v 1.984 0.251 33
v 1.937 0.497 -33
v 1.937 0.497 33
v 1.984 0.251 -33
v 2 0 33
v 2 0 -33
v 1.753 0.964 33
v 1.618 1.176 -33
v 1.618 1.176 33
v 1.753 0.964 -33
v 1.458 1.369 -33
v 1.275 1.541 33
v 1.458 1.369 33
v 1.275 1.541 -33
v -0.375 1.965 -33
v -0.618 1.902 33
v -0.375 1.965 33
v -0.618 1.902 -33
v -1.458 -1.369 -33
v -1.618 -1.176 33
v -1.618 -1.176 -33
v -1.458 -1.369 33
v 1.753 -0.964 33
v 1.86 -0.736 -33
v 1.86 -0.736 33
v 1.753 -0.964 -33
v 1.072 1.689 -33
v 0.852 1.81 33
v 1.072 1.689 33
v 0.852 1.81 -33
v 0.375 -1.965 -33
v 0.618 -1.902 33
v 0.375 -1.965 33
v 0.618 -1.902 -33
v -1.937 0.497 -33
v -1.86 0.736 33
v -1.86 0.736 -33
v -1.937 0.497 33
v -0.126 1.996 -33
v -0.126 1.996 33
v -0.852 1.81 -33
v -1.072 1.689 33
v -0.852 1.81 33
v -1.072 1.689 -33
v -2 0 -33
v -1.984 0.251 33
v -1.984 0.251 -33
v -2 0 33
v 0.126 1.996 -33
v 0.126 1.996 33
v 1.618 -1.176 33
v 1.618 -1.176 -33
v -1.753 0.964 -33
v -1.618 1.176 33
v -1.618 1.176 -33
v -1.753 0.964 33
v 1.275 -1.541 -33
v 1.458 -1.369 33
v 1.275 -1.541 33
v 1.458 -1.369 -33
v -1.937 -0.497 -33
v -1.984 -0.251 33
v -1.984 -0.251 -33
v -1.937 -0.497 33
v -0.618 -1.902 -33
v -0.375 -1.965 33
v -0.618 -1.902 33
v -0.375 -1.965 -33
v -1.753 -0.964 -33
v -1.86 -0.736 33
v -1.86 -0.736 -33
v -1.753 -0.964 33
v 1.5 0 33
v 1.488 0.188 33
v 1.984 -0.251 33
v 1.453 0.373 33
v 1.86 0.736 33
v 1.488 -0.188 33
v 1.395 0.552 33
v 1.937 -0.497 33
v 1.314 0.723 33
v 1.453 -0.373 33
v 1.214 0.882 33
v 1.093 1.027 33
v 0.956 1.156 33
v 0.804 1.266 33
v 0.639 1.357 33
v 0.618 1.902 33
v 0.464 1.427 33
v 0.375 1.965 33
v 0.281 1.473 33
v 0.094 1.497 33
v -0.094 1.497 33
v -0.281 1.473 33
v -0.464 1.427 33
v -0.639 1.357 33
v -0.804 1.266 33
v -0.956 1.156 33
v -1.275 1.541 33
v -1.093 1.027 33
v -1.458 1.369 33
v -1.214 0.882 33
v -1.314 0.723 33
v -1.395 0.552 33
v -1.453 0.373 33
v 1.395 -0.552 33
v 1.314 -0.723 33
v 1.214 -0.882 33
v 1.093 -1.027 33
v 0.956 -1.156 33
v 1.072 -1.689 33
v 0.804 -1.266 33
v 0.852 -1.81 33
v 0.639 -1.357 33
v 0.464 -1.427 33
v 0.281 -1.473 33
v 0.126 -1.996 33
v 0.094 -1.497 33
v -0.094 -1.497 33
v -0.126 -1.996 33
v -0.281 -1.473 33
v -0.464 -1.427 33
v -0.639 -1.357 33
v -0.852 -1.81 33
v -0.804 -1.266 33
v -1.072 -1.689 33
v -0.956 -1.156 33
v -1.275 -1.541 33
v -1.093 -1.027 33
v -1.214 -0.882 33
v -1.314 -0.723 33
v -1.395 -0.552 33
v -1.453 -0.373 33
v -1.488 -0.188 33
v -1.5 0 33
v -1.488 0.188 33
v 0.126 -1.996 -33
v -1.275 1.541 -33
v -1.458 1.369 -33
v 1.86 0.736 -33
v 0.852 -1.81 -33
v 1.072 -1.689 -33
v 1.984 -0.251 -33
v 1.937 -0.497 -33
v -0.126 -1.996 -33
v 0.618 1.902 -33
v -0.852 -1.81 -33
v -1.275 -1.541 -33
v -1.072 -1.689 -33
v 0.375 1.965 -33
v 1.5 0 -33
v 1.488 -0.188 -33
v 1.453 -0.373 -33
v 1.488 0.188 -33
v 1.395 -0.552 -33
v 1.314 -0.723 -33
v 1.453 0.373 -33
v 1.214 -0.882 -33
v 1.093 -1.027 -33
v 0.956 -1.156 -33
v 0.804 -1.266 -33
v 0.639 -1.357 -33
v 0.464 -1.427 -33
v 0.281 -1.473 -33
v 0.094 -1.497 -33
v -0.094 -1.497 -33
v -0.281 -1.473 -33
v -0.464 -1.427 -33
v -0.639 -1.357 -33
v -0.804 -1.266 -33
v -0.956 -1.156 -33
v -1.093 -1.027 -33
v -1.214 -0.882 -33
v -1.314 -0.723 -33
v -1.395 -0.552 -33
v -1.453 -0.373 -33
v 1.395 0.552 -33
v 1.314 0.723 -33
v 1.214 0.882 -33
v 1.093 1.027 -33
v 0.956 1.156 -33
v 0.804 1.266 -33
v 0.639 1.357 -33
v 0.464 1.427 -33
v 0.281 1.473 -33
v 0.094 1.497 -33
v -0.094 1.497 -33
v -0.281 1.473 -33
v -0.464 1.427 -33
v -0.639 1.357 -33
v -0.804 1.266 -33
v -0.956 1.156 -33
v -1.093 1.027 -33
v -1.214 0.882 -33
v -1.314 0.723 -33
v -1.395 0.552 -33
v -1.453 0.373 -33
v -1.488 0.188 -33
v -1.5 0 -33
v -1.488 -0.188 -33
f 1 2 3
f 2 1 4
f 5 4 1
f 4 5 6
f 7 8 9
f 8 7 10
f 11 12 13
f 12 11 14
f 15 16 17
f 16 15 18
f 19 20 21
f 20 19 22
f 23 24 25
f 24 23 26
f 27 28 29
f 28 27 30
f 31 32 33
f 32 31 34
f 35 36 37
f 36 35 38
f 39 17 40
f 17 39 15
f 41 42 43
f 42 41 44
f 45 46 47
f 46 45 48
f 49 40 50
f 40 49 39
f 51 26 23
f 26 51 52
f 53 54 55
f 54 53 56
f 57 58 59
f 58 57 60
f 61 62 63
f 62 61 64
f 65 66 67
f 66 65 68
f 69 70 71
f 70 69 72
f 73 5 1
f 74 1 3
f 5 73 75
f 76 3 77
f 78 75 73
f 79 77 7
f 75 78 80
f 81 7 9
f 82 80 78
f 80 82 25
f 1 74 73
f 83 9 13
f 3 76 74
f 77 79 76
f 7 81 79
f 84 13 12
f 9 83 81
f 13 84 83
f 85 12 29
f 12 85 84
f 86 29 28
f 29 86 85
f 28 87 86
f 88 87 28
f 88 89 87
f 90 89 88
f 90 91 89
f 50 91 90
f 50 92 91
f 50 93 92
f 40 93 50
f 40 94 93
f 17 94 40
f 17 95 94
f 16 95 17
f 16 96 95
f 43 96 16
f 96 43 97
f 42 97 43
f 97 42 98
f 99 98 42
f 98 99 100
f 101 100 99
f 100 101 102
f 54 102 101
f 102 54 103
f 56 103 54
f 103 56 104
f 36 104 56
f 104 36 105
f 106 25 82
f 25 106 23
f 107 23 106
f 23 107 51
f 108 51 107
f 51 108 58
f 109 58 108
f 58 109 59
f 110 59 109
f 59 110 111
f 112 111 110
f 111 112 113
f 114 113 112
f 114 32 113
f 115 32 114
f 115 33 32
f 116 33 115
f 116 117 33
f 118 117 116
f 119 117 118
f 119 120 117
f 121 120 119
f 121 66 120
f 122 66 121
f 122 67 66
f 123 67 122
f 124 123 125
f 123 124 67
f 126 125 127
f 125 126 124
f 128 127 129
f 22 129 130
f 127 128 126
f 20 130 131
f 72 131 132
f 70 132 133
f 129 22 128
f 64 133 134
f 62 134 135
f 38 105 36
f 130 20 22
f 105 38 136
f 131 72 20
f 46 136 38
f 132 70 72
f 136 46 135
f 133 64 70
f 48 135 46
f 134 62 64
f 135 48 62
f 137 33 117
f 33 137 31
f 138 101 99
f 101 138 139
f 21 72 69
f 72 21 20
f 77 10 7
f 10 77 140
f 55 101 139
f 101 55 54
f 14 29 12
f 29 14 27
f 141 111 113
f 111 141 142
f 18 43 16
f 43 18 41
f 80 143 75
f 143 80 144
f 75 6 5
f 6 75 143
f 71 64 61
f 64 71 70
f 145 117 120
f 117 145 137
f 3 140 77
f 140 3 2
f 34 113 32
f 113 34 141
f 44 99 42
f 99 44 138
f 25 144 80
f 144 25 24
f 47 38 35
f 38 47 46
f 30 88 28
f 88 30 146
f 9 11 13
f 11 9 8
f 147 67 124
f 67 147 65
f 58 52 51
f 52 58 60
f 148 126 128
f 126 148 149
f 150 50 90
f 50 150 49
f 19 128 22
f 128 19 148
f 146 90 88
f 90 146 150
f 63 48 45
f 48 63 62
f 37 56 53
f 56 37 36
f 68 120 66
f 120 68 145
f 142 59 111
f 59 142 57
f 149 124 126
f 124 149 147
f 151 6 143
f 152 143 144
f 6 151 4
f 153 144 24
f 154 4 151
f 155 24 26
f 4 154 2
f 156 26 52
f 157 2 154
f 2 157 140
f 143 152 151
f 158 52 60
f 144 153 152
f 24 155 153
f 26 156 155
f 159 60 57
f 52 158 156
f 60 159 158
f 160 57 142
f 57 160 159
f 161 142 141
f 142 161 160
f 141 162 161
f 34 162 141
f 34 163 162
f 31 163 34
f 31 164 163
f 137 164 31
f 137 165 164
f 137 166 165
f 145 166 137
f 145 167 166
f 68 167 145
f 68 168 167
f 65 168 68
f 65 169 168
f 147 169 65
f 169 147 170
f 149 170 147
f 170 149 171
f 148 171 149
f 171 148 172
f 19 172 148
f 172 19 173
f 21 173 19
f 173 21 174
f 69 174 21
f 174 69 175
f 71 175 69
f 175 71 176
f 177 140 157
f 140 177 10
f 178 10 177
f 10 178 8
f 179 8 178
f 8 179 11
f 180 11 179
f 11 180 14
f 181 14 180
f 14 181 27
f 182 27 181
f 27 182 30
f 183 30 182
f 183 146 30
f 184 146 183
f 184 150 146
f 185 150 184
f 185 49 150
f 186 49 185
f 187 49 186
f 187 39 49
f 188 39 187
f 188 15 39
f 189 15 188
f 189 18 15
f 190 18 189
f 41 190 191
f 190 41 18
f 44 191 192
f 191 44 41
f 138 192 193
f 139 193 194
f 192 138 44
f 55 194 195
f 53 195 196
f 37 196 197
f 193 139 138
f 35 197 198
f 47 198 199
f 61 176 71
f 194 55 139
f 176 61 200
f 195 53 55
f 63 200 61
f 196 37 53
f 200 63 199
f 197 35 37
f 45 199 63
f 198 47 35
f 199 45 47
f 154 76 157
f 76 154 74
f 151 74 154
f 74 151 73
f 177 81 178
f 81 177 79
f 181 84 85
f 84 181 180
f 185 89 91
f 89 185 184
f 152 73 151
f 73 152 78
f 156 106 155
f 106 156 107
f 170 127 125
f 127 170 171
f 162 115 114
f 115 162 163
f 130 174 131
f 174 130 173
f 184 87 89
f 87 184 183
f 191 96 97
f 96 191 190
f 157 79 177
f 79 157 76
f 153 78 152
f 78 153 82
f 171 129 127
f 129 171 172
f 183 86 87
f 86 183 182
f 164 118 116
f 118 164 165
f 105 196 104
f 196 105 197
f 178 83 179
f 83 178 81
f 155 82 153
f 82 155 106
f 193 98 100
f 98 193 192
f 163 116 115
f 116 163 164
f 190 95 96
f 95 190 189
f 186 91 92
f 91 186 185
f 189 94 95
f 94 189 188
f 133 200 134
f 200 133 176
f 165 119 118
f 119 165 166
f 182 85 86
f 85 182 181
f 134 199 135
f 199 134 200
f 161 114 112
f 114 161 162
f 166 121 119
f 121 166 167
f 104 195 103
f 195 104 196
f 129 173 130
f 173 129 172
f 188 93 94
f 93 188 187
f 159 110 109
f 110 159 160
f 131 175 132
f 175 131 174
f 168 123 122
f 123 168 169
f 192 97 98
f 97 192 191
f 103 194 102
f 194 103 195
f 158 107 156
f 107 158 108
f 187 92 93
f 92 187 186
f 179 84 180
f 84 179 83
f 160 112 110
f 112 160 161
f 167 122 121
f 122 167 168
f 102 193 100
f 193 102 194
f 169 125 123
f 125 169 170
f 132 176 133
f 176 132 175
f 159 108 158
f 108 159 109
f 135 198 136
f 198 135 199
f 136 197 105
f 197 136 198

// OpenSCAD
$fn = 50;


difference() {
	union() {
		translate(v = [0, 0, -33.0000000000]) {
			cylinder(h = 66, r = 2.0000000000);
		}
	}
	union() {
		translate(v = [0, 0, -100.0000000000]) {
			cylinder(h = 200, r = 1.5000000000);
		}
	}
}
